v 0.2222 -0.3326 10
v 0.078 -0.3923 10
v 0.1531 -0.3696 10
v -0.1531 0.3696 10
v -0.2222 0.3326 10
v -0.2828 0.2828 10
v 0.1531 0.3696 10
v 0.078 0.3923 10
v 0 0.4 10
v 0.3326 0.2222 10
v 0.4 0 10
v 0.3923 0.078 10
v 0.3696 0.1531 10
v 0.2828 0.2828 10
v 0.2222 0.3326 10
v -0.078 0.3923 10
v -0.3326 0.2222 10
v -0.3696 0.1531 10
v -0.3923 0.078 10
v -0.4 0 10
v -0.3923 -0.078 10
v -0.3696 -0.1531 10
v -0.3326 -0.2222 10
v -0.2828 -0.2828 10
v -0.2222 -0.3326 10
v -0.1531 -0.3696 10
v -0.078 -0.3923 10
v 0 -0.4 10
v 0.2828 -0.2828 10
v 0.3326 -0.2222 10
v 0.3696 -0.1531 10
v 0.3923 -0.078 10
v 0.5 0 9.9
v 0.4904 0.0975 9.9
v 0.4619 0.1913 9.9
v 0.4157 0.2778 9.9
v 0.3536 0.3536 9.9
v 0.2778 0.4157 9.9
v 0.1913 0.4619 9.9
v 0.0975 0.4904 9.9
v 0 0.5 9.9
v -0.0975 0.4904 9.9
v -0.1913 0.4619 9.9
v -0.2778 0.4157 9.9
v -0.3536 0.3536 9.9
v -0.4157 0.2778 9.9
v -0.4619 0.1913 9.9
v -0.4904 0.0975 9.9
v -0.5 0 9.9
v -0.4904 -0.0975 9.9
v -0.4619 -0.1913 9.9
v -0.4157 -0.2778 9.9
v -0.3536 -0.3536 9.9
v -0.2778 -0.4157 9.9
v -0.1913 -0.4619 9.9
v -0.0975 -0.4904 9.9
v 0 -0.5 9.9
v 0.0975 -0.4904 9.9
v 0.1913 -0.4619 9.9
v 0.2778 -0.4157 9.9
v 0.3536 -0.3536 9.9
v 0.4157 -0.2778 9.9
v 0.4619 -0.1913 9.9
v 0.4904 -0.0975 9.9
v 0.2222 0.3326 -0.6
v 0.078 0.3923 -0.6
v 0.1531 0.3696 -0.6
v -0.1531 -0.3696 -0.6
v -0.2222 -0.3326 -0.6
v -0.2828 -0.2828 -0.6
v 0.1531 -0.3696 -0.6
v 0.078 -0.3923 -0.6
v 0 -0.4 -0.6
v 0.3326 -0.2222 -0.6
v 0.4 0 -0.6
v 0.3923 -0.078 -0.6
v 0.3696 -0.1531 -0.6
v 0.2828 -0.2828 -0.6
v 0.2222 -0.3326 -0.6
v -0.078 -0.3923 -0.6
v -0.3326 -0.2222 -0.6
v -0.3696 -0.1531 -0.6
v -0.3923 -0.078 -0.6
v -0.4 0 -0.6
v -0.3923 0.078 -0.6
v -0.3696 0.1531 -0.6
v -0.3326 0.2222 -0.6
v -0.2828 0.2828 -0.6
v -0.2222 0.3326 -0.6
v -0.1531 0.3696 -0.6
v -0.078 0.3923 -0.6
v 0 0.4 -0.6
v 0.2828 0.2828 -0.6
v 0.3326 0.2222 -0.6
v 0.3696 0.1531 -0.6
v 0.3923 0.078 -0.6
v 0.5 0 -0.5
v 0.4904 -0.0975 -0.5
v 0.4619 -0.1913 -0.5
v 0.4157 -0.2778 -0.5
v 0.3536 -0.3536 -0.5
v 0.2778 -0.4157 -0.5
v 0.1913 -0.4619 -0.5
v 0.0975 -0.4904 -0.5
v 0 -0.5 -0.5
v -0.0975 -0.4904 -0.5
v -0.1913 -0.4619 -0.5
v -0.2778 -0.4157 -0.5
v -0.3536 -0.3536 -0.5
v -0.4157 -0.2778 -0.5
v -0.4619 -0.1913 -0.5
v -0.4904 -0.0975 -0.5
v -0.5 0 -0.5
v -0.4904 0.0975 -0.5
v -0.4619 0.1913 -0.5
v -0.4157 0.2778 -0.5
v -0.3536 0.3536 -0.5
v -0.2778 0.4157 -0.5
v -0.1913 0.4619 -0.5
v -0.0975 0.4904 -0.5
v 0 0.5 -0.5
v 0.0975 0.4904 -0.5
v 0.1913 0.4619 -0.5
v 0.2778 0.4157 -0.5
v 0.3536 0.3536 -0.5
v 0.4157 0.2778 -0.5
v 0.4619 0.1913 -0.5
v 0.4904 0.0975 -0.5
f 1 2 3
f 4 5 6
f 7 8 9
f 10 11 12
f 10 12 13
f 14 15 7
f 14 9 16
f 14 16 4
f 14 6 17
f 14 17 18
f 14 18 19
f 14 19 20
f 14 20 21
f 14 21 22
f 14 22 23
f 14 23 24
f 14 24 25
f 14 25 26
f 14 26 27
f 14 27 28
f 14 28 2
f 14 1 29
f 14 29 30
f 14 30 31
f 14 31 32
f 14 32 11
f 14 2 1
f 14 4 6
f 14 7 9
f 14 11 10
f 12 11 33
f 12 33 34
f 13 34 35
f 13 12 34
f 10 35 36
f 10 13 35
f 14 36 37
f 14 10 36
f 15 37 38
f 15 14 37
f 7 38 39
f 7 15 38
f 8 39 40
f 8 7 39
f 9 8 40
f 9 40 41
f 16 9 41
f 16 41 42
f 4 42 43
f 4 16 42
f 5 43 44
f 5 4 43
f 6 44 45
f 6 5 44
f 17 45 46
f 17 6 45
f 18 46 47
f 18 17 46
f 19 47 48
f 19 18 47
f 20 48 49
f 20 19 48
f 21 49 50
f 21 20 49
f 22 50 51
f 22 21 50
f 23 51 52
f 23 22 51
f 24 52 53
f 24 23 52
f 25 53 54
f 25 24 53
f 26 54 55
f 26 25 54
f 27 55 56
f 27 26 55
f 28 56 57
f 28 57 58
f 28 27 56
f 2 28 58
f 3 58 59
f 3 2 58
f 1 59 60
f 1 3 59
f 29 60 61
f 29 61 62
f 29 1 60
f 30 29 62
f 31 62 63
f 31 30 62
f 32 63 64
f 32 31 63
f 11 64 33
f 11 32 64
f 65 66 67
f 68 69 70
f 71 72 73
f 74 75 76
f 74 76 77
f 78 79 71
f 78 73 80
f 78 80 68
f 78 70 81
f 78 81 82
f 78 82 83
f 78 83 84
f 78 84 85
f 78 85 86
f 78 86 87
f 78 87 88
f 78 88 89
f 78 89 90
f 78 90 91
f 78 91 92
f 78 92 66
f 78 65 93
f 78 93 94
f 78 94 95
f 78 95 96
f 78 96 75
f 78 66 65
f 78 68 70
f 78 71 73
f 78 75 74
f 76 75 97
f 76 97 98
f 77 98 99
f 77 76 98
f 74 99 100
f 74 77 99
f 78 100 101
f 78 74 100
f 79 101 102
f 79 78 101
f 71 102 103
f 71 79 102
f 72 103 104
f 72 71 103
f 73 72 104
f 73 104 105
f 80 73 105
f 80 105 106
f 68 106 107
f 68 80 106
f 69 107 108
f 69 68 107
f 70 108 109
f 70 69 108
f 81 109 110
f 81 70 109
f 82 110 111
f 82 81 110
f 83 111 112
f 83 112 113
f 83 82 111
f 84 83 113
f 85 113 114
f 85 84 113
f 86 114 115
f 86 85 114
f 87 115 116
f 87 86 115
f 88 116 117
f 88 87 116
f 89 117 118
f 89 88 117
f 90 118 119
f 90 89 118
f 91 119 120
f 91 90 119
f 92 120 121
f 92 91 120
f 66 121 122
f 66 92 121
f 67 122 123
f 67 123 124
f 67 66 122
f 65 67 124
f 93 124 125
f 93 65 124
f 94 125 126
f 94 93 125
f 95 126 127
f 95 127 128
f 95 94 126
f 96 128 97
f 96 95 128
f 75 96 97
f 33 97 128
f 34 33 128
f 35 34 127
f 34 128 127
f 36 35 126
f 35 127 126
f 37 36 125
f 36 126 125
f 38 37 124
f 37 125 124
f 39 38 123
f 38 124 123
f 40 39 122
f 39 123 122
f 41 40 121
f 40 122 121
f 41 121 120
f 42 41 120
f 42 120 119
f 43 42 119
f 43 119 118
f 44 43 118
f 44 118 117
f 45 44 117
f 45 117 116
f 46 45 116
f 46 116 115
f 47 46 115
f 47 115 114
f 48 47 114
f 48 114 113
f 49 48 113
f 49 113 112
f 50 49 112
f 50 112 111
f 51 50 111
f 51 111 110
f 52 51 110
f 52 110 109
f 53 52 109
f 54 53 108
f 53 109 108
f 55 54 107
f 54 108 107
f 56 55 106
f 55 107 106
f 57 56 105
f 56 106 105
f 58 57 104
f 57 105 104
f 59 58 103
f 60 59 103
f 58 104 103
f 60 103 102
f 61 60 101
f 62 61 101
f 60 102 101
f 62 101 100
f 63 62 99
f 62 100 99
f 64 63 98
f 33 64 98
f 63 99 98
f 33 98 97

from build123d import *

# Parameters (mm, degrees)
EXTRUDE_1_DEPTH      = 10
EXTRUDE_1_DEPTH_BACK = 1
SKETCH_1_R           = 0.5
CHAMFER_1_SIZE       = 0.1
SKETCH_3_R           = 0.5
CUT_EXTRUDE_1_DEPTH  = 0.4
CHAMFER_2_SIZE       = 0.1


with BuildPart() as part:
    # 草图1 → 凸台-拉伸1 (new, two sides: drawn at the far end of the back side and taken through both)
    with BuildSketch(Plane.XY.offset(-EXTRUDE_1_DEPTH_BACK)):
        Circle(SKETCH_1_R)
    extrude(amount=EXTRUDE_1_DEPTH + EXTRUDE_1_DEPTH_BACK)

    # 倒角1
    chamfer_1_edges = [part.edges().sort_by_distance(p)[0] for p in [
        (-0.5, 0, -1),
        (-0.5, 0, 10),
    ]]
    chamfer(chamfer_1_edges, length=CHAMFER_1_SIZE)

    # 草图3 → 切除-拉伸1 (cut)
    with BuildSketch(Plane(origin=(0, 0, -1), x_dir=(-1, 0, 0), z_dir=(0, 0, -1))):
        with Locations(Location((0, 0, 0), (0, 0, 180))):
            Circle(SKETCH_3_R)
    extrude(amount=-CUT_EXTRUDE_1_DEPTH, mode=Mode.SUBTRACT)

    # 倒角2
    chamfer_2_edges = [part.edges().sort_by_distance(p)[0] for p in [
        (-0.5, 0, -0.6),
    ]]
    chamfer(chamfer_2_edges, length=CHAMFER_2_SIZE)


solid = part.part
